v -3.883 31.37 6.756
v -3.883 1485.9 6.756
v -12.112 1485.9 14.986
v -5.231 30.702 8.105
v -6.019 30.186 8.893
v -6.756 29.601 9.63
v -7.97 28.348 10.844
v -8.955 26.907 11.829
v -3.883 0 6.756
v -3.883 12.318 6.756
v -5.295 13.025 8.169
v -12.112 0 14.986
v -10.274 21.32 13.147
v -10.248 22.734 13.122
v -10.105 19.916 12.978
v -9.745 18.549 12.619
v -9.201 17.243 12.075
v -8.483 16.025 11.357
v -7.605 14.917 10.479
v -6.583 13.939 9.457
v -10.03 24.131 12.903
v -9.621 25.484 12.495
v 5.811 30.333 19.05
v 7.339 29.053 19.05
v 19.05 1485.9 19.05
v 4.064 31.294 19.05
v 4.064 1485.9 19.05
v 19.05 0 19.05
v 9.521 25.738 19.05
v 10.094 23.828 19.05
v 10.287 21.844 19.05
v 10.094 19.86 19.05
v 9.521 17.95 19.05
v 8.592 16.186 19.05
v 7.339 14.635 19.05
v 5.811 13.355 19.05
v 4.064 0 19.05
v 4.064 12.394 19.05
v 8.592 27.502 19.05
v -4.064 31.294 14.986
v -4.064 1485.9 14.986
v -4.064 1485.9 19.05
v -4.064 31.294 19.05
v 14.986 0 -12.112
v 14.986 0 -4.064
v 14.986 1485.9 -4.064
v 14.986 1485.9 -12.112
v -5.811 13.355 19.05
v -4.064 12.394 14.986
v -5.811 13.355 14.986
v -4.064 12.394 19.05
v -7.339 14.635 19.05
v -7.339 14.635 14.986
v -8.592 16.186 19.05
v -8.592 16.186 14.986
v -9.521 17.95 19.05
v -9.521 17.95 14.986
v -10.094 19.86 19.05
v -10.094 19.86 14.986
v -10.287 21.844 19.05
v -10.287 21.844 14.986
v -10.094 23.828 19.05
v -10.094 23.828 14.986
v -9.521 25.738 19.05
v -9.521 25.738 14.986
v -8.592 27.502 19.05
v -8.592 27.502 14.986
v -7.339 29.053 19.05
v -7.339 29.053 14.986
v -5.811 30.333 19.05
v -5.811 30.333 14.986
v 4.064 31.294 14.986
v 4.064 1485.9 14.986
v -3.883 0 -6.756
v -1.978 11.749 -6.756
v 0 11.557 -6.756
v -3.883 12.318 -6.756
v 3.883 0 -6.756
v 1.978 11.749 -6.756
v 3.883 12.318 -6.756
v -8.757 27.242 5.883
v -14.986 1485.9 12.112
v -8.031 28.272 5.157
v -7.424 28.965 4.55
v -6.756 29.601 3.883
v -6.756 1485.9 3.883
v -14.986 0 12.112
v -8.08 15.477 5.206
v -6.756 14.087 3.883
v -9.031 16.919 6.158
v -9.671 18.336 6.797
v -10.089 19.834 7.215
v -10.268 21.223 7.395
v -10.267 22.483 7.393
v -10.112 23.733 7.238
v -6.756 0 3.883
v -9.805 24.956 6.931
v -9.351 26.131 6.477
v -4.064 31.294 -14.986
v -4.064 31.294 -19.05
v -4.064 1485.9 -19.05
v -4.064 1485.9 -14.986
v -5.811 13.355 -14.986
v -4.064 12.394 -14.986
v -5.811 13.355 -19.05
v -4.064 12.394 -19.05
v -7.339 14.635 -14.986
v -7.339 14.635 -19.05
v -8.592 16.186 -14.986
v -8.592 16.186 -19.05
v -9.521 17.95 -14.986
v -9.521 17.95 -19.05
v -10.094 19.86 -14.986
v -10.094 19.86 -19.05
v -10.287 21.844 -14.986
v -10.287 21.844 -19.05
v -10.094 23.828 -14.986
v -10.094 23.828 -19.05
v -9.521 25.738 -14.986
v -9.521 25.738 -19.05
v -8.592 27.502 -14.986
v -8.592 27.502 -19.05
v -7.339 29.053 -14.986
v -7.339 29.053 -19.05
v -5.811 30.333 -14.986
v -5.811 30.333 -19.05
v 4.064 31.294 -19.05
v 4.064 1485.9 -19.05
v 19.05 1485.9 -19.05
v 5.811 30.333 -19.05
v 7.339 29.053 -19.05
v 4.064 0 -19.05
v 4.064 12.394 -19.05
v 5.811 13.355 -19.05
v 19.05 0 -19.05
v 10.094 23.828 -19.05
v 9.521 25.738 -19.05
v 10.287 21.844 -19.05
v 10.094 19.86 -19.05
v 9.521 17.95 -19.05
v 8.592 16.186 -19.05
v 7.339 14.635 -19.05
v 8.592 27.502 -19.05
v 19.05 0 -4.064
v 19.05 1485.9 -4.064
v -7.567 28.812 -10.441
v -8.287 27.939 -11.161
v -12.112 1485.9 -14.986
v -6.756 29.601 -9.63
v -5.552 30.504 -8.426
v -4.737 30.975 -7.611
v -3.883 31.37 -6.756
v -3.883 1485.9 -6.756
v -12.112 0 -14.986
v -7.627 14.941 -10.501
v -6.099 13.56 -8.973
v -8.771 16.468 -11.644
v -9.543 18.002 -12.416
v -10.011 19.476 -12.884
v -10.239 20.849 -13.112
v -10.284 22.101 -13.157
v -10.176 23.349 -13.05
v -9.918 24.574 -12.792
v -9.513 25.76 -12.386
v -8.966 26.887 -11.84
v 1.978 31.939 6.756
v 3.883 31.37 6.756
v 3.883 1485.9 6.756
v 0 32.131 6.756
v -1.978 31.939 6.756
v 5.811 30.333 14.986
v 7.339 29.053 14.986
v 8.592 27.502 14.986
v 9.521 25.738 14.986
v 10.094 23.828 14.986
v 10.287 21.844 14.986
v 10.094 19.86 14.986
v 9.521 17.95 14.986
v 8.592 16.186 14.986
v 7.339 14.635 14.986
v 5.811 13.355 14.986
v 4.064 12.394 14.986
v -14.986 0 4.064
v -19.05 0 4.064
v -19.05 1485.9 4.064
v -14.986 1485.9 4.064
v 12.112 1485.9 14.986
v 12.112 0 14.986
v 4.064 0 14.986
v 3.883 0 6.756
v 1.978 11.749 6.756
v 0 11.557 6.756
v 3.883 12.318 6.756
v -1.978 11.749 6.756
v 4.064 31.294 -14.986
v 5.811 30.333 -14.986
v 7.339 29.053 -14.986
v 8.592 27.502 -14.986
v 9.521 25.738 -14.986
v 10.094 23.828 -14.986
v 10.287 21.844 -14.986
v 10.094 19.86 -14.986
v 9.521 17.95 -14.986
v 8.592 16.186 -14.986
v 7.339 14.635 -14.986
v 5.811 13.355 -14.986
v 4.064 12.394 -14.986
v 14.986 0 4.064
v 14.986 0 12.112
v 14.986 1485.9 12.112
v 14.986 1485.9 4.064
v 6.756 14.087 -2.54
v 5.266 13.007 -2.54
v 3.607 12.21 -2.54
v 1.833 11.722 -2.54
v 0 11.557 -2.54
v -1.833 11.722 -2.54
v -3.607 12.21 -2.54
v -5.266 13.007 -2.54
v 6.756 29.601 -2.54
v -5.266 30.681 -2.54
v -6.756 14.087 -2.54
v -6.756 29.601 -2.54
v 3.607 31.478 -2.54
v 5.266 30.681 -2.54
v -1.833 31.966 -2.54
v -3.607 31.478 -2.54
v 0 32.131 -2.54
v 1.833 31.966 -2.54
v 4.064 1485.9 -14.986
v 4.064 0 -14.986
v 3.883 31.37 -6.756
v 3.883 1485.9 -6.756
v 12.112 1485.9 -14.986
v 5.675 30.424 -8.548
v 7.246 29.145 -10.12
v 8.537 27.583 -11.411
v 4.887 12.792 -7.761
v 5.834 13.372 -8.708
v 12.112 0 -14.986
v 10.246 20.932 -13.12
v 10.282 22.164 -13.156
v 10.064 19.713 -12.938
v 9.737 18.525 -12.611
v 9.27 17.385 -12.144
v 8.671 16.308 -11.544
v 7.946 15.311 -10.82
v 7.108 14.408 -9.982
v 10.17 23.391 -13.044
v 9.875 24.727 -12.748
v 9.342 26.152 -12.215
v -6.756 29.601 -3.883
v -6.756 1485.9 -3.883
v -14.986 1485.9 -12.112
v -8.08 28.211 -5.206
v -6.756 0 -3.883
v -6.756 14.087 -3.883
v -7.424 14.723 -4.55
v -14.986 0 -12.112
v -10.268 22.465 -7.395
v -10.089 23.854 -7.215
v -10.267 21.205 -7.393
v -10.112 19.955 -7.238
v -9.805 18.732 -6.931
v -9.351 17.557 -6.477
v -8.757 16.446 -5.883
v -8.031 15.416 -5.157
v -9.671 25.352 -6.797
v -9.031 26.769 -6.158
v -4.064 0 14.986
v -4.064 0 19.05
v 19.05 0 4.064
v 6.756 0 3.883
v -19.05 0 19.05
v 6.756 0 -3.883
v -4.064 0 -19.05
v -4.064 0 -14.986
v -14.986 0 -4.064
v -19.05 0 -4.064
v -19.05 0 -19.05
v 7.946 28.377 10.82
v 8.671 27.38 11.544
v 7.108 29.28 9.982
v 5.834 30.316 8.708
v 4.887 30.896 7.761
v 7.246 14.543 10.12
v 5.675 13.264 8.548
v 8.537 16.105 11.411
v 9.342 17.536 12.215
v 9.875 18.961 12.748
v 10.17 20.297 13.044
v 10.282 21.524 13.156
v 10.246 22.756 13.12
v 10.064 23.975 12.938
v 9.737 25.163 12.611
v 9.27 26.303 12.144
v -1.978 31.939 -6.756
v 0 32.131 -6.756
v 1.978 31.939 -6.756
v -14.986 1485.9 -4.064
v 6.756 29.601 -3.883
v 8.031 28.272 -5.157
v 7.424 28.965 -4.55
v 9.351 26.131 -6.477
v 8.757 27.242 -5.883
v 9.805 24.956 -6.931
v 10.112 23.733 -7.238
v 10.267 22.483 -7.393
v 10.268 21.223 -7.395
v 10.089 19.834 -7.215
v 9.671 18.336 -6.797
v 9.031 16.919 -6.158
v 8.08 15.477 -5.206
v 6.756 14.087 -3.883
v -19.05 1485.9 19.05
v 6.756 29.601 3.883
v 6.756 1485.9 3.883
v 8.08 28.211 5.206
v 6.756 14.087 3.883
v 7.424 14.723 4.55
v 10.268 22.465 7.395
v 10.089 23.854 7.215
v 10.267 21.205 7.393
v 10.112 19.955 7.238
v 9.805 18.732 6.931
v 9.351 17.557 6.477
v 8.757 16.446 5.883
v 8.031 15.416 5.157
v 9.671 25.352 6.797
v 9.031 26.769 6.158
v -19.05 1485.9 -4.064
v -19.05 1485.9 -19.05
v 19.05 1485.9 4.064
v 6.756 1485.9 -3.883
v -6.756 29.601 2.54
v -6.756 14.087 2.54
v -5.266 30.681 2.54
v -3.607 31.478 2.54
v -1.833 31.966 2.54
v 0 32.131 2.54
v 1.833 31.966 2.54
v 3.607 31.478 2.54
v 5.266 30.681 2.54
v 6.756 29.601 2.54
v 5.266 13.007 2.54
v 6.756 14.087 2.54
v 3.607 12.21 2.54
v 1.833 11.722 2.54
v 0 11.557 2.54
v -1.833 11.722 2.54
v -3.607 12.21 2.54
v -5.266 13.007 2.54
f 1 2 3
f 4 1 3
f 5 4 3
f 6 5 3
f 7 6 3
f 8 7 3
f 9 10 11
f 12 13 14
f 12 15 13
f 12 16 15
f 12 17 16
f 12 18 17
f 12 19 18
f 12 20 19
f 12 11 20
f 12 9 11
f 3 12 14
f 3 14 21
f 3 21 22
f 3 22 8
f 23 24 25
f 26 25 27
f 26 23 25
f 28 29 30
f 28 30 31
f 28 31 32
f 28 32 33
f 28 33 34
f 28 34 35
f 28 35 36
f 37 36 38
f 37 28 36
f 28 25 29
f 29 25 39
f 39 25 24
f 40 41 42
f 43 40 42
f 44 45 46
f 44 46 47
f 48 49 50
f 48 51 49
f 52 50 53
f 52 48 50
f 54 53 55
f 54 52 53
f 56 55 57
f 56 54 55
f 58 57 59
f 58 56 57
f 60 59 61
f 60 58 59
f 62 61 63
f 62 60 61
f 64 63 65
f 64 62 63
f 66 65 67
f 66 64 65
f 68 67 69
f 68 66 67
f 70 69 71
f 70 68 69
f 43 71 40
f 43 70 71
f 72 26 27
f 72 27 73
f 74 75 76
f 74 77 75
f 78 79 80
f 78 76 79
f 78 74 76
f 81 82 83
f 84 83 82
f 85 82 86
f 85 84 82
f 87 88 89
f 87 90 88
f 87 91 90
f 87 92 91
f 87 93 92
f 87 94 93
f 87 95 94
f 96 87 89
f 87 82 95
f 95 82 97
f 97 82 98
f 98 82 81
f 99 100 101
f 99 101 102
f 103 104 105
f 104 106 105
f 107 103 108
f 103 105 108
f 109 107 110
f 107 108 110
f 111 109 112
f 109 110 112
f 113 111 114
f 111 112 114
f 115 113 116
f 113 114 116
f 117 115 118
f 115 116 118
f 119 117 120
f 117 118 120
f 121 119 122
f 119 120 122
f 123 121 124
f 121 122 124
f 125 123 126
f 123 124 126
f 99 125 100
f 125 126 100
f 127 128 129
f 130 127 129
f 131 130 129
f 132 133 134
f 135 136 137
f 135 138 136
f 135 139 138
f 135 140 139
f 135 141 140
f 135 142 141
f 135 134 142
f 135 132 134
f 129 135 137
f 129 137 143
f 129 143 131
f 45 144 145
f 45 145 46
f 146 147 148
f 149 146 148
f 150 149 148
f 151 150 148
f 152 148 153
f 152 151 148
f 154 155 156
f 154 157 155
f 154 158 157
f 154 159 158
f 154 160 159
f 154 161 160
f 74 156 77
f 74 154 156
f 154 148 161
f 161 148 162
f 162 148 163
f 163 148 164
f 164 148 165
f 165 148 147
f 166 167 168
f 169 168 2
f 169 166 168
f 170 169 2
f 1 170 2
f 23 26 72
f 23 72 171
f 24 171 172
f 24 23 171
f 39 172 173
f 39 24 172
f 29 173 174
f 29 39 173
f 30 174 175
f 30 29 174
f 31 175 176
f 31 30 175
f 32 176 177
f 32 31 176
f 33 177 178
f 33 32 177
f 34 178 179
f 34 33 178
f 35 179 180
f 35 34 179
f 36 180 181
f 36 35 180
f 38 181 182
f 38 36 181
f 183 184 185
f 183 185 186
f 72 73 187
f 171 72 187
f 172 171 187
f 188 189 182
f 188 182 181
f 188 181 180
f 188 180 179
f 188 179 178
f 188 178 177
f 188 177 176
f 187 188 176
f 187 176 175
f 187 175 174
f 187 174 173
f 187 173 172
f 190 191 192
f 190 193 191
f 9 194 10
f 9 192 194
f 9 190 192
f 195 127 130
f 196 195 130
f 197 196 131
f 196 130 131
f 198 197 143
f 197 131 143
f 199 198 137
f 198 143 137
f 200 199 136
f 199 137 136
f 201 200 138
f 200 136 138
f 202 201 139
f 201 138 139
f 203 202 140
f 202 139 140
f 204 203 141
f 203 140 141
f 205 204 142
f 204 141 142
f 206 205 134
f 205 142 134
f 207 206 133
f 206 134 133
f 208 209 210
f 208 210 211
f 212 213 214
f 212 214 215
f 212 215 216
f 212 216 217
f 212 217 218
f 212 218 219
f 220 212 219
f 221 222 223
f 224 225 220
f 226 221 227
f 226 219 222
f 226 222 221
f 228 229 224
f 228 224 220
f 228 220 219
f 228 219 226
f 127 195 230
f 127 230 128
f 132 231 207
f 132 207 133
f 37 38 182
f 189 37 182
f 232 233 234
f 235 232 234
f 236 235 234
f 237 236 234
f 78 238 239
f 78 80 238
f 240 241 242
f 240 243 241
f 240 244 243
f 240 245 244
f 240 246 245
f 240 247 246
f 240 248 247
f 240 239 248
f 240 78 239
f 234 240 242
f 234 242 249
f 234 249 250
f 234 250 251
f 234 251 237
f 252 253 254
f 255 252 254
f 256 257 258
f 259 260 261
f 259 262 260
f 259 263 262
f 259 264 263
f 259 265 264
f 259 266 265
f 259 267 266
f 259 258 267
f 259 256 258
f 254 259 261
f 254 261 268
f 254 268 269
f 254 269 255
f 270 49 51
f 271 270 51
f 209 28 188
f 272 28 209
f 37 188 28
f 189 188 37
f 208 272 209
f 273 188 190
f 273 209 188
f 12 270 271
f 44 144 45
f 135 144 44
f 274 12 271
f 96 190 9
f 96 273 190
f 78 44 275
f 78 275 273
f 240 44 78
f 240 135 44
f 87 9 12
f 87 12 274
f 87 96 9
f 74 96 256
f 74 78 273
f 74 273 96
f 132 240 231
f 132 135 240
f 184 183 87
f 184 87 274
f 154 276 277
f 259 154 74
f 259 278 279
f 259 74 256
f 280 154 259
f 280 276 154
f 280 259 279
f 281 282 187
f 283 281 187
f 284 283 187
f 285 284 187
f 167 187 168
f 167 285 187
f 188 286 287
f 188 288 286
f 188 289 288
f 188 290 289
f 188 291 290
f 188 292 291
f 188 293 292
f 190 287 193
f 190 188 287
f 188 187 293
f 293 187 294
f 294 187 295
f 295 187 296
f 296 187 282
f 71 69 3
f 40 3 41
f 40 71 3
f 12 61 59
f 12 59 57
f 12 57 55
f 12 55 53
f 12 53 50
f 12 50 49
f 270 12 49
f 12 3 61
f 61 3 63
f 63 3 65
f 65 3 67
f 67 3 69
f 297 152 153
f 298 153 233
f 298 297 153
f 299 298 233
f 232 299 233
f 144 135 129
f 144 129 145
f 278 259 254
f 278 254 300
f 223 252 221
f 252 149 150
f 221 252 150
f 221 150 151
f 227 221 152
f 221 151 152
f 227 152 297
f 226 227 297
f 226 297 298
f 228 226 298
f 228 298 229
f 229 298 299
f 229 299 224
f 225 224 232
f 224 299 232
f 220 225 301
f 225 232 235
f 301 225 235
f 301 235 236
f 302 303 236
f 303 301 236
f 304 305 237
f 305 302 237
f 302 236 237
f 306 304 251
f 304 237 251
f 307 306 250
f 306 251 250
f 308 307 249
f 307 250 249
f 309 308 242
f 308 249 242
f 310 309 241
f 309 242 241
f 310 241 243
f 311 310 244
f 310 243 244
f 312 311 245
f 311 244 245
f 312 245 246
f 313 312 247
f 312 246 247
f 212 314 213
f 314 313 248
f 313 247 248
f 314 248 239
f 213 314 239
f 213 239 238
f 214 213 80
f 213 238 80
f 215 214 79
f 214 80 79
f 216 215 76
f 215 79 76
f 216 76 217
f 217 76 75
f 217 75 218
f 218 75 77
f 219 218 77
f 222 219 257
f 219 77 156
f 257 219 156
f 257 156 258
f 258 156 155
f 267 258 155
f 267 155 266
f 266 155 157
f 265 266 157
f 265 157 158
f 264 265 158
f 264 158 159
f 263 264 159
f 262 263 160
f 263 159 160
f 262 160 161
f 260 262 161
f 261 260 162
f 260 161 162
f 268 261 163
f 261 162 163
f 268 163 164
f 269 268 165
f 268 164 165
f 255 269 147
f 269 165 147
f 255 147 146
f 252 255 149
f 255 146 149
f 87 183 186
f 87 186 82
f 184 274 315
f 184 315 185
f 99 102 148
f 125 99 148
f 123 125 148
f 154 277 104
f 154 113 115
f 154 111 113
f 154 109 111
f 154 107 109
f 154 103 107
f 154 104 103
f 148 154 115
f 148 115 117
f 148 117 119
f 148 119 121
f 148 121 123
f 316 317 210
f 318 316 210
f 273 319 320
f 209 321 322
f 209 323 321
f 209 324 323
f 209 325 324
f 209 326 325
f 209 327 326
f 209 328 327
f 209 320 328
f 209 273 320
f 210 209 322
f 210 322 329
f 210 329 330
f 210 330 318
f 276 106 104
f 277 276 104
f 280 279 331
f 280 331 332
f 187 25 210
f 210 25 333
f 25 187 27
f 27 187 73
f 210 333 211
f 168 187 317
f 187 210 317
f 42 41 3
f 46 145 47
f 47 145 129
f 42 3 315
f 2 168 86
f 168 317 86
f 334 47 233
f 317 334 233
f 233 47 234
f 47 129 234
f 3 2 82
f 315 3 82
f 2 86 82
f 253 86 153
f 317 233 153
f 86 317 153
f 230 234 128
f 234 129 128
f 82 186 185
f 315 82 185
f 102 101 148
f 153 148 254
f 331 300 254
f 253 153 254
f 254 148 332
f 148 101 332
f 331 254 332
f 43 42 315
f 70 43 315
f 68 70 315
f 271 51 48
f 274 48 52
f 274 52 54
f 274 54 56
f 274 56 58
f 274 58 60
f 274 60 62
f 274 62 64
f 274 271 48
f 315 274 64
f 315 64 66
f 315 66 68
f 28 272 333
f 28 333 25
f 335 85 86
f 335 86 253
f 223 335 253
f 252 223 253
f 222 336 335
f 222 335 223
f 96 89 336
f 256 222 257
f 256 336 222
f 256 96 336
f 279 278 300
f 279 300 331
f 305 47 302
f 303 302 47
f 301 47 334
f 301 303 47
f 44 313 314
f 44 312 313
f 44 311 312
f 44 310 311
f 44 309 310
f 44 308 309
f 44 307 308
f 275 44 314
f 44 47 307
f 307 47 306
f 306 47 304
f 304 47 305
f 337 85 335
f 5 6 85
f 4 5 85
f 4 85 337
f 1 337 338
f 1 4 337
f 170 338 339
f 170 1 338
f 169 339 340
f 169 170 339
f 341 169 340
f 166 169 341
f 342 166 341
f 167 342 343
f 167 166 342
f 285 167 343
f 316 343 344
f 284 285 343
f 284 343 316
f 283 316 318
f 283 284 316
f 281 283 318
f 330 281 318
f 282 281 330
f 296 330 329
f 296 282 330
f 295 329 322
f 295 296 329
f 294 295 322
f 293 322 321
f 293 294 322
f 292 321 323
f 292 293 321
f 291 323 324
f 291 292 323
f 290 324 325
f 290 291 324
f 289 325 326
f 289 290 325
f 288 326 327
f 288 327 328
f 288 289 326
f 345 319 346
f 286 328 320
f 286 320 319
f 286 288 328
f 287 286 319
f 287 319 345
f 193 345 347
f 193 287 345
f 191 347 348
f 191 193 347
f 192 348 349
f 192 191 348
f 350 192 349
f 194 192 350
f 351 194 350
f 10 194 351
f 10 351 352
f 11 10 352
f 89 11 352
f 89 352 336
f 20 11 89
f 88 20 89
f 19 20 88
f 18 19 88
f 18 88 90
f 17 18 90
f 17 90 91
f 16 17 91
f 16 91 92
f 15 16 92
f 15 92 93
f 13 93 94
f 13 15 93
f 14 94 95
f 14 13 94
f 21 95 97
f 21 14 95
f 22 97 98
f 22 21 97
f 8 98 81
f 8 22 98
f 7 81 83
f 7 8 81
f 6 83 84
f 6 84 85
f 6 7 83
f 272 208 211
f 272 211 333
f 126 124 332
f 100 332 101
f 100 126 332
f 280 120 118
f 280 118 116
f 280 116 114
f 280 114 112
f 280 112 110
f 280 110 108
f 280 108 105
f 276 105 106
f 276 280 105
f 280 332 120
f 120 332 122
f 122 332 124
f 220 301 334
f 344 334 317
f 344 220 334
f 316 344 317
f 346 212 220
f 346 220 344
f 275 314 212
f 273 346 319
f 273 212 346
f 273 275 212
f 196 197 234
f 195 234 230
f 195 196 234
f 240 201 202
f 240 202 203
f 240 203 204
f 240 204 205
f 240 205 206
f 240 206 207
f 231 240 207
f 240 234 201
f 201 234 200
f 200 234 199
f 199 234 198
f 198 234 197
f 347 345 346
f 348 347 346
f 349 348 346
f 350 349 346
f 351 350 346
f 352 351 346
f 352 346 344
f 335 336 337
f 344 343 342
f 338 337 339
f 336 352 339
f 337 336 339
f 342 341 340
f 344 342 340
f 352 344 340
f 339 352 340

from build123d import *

# Parameters (mm, degrees)
BOSS_EXTRUDE1_DEPTH = 1485.9
SKETCH3_R           = 10.287
CUT_EXTRUDE1_DEPTH  = 16.51


with BuildPart() as part:
    # Sketch2 → Boss-Extrude1 (new body)
    with BuildSketch(Plane(origin=(0.594697292, 0, 0.594697292), x_dir=(1, 0, 0), z_dir=(0, 1, 0))):
        Polygon((-19.644697292, 19.644697292), (-4.658697292, 19.644697292), (-4.658697292, 15.580697292), (-12.707015333, 15.580697292), (-4.477415333, 7.351097292), (3.288020749, 7.351097292), (11.517620749, 15.580697292), (3.469302708, 15.580697292), (3.469302708, 19.644697292), (18.455302708, 19.644697292), (18.455302708, 4.658697292), (14.391302708, 4.658697292), (14.391302708, 12.707015333), (6.161702708, 4.477415333), (6.161702708, -3.288020749), (14.391302708, -11.517620749), (14.391302708, -3.469302708), (18.455302708, -3.469302708), (18.455302708, -18.455302708), (3.469302708, -18.455302708), (3.469302708, -14.391302708), (11.517620749, -14.391302708), (3.288020749, -6.161702708), (-4.477415333, -6.161702708), (-12.707015333, -14.391302708), (-4.658697292, -14.391302708), (-4.658697292, -18.455302708), (-19.644697292, -18.455302708), (-19.644697292, -3.469302708), (-15.580697292, -3.469302708), (-15.580697292, -11.517620749), (-7.351097292, -3.288020749), (-7.351097292, 4.477415333), (-15.580697292, 12.707015333), (-15.580697292, 4.658697292), (-19.644697292, 4.658697292), align=None)
    extrude(amount=BOSS_EXTRUDE1_DEPTH)

    # Sketch3 → Cut-Extrude1 (cut)
    with BuildSketch(Plane(origin=(0, 0, -19.05), x_dir=(-1, 0, 0), z_dir=(0, 0, -1))):
        with Locations(Location((0, 21.844, 0), (0, 0, 48.944473627))):
            Circle(SKETCH3_R)
    cut_extrude1 = extrude(amount=-CUT_EXTRUDE1_DEPTH, mode=Mode.SUBTRACT)

    # Mirror1: Cut-Extrude1 across plane
    add(cut_extrude1.mirror(Plane.XY), mode=Mode.SUBTRACT)


solid = part.part
